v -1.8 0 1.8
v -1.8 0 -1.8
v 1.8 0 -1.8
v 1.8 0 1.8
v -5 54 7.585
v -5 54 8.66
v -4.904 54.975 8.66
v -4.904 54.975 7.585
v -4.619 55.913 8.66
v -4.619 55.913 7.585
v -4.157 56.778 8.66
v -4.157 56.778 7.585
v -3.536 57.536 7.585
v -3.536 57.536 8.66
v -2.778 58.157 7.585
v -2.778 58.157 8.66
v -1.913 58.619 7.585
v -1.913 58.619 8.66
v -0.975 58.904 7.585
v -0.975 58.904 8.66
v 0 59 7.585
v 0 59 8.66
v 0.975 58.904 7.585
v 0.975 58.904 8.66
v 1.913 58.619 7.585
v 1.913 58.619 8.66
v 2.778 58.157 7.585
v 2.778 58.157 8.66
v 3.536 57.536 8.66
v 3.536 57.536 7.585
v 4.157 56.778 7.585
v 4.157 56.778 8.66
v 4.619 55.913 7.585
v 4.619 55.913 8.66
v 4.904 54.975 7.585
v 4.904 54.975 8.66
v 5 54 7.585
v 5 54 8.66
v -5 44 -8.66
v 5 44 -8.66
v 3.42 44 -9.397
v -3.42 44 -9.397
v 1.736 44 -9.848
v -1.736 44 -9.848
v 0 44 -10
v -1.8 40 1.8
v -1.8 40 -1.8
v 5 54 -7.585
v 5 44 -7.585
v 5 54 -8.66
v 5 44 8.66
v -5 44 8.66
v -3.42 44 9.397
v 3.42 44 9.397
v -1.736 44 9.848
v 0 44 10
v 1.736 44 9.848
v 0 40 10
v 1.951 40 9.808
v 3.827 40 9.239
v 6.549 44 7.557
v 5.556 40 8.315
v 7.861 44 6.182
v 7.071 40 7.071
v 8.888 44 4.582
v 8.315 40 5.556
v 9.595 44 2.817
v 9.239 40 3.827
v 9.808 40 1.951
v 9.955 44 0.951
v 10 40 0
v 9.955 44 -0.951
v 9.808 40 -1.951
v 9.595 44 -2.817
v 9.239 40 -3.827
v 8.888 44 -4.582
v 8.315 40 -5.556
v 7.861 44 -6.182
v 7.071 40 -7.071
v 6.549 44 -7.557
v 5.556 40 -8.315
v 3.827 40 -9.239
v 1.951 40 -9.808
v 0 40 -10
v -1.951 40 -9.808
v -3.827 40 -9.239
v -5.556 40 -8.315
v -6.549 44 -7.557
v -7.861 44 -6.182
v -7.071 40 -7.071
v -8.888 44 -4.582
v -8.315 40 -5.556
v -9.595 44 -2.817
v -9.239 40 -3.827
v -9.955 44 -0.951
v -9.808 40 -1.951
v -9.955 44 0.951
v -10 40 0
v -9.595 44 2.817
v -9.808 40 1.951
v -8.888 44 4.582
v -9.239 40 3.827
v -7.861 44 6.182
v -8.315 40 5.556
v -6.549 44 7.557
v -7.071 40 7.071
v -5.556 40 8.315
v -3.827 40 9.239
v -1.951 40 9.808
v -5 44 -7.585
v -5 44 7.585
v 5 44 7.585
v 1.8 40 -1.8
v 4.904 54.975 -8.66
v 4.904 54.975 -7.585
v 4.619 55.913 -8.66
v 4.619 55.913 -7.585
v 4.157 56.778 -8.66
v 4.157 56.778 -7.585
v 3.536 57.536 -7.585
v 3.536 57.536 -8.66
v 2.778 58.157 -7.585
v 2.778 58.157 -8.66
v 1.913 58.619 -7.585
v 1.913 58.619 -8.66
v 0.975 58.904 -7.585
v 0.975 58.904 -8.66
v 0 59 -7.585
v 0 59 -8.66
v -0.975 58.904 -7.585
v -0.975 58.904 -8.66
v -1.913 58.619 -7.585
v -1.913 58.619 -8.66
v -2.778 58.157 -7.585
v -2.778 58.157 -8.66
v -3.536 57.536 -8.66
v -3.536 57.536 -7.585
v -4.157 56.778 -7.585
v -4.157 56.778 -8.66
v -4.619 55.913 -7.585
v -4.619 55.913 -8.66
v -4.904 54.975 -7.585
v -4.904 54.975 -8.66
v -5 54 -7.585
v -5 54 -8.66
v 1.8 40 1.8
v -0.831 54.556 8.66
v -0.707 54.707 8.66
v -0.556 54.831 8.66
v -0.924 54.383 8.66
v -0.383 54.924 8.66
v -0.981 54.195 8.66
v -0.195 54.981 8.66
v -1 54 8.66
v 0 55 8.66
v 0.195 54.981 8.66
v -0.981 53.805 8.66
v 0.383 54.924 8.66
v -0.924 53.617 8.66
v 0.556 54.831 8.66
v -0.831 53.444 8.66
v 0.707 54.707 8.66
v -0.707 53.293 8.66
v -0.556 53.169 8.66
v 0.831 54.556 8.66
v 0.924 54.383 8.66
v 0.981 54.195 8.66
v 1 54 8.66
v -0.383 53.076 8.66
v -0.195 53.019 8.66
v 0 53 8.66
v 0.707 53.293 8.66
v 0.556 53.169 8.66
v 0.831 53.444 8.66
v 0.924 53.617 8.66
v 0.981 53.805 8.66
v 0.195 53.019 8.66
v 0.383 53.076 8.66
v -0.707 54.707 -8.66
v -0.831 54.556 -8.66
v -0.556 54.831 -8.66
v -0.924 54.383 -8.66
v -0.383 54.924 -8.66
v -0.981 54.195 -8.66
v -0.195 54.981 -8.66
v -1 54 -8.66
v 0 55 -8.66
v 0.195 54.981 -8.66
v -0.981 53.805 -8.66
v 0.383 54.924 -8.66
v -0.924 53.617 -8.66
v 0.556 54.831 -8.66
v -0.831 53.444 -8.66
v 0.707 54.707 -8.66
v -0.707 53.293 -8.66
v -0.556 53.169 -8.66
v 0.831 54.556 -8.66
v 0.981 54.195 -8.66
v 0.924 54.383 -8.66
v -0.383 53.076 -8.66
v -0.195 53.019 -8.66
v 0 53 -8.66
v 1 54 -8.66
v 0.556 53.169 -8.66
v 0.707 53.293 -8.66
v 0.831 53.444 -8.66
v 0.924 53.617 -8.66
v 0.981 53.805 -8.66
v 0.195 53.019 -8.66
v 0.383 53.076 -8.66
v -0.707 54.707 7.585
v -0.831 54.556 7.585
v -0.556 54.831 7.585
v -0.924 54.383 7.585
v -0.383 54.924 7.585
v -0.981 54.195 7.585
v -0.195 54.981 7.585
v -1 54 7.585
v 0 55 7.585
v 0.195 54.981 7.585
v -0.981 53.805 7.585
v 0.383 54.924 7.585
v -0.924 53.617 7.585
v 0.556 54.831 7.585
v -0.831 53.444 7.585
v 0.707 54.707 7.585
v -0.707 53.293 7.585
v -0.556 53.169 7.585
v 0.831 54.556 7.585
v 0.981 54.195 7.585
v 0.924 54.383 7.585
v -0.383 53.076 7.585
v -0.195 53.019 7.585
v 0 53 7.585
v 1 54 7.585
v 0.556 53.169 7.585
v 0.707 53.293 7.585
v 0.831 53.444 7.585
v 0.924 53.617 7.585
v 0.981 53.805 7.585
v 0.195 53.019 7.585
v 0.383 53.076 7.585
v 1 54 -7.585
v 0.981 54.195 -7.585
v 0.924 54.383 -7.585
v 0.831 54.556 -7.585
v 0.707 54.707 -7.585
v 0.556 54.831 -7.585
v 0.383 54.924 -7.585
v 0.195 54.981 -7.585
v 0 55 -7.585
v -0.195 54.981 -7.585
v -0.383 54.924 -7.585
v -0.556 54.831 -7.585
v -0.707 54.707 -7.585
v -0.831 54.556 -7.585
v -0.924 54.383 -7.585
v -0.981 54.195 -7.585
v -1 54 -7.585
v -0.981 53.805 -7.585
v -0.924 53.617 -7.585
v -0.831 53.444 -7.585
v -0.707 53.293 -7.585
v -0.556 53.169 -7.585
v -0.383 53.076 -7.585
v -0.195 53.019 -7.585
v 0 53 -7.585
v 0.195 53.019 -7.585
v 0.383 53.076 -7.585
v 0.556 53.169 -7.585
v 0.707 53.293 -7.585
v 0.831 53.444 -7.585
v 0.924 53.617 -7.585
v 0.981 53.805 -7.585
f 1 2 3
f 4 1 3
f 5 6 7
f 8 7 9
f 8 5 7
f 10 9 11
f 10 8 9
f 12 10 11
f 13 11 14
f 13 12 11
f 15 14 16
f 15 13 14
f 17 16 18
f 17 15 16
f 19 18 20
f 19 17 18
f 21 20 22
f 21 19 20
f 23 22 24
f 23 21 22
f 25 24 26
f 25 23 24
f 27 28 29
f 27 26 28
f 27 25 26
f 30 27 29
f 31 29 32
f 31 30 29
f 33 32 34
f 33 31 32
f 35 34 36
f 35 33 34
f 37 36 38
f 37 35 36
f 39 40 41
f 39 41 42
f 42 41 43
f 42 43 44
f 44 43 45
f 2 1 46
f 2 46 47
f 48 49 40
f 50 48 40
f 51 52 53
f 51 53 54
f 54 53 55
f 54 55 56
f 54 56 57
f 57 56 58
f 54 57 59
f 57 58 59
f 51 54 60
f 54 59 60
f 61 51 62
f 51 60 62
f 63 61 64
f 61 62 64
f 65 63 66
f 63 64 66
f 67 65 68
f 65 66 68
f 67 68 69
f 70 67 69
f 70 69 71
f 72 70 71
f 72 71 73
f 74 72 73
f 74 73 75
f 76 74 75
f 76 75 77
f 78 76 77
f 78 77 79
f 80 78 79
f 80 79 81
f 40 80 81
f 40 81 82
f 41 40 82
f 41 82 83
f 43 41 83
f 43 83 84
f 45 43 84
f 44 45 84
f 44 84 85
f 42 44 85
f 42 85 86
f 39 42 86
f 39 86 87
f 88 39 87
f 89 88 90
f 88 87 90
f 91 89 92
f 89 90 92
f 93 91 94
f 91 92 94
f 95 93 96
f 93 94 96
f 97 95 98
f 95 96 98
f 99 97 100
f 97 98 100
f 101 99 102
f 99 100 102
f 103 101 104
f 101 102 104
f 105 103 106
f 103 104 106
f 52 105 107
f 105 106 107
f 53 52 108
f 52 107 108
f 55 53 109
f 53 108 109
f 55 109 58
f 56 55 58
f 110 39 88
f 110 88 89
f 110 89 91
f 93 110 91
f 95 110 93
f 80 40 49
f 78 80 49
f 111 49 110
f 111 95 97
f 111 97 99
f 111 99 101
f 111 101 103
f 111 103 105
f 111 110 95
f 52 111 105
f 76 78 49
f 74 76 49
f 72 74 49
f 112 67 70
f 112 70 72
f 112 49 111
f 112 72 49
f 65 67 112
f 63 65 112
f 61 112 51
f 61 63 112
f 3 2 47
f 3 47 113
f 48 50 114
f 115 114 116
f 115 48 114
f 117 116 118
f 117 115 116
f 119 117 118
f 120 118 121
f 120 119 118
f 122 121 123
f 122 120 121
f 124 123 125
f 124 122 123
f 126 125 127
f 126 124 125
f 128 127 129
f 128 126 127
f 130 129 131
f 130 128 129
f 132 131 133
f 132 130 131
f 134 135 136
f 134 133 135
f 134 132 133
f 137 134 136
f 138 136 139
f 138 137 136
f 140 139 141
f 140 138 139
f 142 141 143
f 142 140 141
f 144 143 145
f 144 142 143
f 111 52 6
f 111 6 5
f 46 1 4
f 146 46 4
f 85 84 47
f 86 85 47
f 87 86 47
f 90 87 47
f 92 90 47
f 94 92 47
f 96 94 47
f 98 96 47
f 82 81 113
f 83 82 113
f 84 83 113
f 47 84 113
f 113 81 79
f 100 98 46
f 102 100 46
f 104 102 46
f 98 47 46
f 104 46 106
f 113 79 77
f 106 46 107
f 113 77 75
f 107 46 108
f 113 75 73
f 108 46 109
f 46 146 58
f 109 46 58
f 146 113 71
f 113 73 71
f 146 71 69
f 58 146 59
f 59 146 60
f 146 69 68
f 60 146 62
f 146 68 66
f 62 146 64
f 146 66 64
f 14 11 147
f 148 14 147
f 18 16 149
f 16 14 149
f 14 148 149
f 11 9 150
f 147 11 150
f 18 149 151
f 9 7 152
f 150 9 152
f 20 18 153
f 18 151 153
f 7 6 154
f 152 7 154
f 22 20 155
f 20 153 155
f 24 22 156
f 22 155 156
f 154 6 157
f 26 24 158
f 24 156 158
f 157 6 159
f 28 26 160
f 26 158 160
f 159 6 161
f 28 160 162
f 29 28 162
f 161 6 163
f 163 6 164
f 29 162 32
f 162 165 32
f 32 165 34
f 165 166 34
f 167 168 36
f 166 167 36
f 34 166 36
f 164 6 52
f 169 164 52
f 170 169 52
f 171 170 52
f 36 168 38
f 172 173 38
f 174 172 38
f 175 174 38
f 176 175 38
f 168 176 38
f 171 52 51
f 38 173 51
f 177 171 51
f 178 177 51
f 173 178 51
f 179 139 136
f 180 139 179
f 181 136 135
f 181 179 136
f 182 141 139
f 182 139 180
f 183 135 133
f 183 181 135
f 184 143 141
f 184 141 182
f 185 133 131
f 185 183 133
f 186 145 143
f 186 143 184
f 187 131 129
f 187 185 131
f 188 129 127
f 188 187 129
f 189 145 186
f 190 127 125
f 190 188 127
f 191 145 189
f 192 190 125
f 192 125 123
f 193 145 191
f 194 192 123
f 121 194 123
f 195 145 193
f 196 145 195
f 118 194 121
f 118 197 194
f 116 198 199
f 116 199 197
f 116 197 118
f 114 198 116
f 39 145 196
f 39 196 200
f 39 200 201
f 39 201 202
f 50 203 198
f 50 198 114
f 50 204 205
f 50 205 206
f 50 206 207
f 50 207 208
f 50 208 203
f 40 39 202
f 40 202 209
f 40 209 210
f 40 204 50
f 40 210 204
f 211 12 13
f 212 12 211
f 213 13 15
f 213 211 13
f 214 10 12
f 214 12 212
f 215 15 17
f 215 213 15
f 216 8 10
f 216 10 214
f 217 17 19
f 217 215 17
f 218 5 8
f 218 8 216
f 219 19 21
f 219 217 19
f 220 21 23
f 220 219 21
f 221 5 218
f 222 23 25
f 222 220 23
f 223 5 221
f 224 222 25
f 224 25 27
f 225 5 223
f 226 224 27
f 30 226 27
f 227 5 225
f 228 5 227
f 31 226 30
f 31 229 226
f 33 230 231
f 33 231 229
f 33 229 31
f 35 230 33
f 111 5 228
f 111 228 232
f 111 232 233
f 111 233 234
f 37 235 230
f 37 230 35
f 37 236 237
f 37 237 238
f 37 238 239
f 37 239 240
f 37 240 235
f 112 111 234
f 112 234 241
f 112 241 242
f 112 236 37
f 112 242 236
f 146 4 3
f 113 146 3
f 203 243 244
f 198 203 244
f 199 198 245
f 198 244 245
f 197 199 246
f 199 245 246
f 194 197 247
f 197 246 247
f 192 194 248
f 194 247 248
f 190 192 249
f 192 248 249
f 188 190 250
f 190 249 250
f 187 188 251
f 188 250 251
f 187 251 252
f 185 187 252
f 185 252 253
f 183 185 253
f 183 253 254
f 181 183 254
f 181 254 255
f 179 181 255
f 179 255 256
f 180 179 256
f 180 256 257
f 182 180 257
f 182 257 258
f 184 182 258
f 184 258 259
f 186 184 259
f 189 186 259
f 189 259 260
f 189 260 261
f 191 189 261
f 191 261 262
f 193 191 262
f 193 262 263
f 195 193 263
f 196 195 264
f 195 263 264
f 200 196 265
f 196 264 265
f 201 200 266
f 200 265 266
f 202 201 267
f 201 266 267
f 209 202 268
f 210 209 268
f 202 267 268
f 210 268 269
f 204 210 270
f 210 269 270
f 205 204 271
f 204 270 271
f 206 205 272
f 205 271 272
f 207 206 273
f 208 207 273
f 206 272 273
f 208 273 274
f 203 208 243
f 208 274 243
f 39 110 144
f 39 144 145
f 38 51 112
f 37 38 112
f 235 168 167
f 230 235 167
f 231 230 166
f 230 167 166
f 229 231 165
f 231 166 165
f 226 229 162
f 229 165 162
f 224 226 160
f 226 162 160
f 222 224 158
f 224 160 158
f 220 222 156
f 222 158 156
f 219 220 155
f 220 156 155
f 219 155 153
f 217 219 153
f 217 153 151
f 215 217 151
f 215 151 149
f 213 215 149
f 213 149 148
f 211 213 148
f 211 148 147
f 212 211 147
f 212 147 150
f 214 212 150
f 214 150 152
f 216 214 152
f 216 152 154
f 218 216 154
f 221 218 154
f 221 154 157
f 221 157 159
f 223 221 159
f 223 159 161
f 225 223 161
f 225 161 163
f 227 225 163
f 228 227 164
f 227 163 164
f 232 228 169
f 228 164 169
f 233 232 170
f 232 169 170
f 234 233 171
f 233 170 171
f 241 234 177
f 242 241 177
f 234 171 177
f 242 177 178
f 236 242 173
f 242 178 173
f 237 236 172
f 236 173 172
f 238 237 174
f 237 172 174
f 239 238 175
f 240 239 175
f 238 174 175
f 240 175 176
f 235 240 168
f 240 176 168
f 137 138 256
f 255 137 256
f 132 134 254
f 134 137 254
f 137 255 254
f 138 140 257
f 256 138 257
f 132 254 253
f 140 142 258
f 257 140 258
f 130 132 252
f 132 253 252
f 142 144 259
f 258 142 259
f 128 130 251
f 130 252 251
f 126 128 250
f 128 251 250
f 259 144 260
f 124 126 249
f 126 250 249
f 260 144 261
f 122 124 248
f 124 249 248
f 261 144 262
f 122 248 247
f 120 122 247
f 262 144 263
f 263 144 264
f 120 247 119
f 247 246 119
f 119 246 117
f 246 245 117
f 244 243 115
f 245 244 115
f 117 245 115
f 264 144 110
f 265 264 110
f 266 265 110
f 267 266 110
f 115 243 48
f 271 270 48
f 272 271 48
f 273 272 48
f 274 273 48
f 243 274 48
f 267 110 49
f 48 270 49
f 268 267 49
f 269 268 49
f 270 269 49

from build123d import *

# Parameters (mm, degrees)
SKETCH2_W           = 3.6
SKETCH2_H           = 3.6
BOSS_EXTRUDE1_DEPTH = 40
SKETCH3_R           = 10
BOSS_EXTRUDE2_DEPTH = 4
SKETCH5_W           = 10
SKETCH5_H           = 1.075357982
BOSS_EXTRUDE3_DEPTH = 15
FILLET3_RADIUS      = 5
FILLET3_LENGTH      = 1.075357982
FILLET4_RADIUS      = 5
FILLET4_LENGTH      = 1.075357982
CUT_EXTRUDE1_REACH  = 64.683
SKETCH6_R           = 1


with BuildPart() as part:
    # Sketch2 → Boss-Extrude1 (new body)
    with BuildSketch(Plane(origin=(0, 0, 0), x_dir=(1, 0, 0), z_dir=(0, 1, 0))):
        Rectangle(SKETCH2_W, SKETCH2_H)
    extrude(amount=BOSS_EXTRUDE1_DEPTH)

    # Sketch3 → Boss-Extrude2 (add)
    with BuildSketch(Plane(origin=(0, 40, 0), x_dir=(1, 0, 0), z_dir=(0, 1, 0))):
        with Locations(Location((0, 0, 0), (0, 0, 270))):
            Circle(SKETCH3_R)
    extrude(amount=BOSS_EXTRUDE2_DEPTH)

    # Sketch5 → Boss-Extrude3 (add)
    with BuildSketch(Plane(origin=(0, 44, 0), x_dir=(1, 0, 0), z_dir=(0, 1, 0))):
        with Locations((0, 8.122575047)):
            Rectangle(SKETCH5_W, SKETCH5_H)
        with Locations((0, -8.122575047)):
            Rectangle(SKETCH5_W, SKETCH5_H)
    extrude(amount=BOSS_EXTRUDE3_DEPTH)

    # Fillet3: full round fillet: the end face becomes a half cylinder, R = half its width
    fillet3_face = Plane((0, 59, 8.122575047), x_dir=(0, 0, -1), z_dir=(0, 1, 0))  # on the end face: x along it, z out of the body
    fillet3_slab = fillet3_face.offset(-FILLET3_RADIUS / 2) * Box(FILLET3_LENGTH, 2 * FILLET3_RADIUS, FILLET3_RADIUS, mode=Mode.PRIVATE)  # the body's end, R deep
    fillet3_round = Plane((0, 54, 8.122575047), x_dir=(0, 1, 0), z_dir=(0, 0, -1)) * Cylinder(FILLET3_RADIUS, FILLET3_LENGTH, mode=Mode.PRIVATE)  # its axis R under the face
    add(fillet3_slab - fillet3_round, mode=Mode.SUBTRACT)

    # Fillet4: full round fillet: the end face becomes a half cylinder, R = half its width
    fillet4_face = Plane((0, 59, -8.122575047), x_dir=(0, 0, 1), z_dir=(0, 1, 0))  # on the end face: x along it, z out of the body
    fillet4_slab = fillet4_face.offset(-FILLET4_RADIUS / 2) * Box(FILLET4_LENGTH, 2 * FILLET4_RADIUS, FILLET4_RADIUS, mode=Mode.PRIVATE)  # the body's end, R deep
    fillet4_round = Plane((0, 54, -8.122575047), x_dir=(0, 1, 0), z_dir=(0, 0, 1)) * Cylinder(FILLET4_RADIUS, FILLET4_LENGTH, mode=Mode.PRIVATE)  # its axis R under the face
    add(fillet4_slab - fillet4_round, mode=Mode.SUBTRACT)

    # Cut-Extrude1: up to this face of the body (flat: up to its plane)
    cut_extrude1_end = Plane(part.part.faces().sort_by_distance((0, 51.008207501, -8.660254038))[0])
    # Sketch6 → Cut-Extrude1 (cut, up to the picked face)
    with BuildSketch(Plane.XY.offset(8.660254038), mode=Mode.PRIVATE) as cut_extrude1_sk1:
        with Locations((0, 54)):
            Circle(SKETCH6_R)
    cut_extrude1_tool1 = split(extrude(cut_extrude1_sk1.sketch, amount=-CUT_EXTRUDE1_REACH, mode=Mode.PRIVATE), bisect_by=cut_extrude1_end, keep=Keep.BOTH, mode=Mode.PRIVATE)
    add(cut_extrude1_tool1.solids().sort_by(Axis((0, 54, 8.660254), (0, 0, -1)))[0], mode=Mode.SUBTRACT)


solid = part.part
